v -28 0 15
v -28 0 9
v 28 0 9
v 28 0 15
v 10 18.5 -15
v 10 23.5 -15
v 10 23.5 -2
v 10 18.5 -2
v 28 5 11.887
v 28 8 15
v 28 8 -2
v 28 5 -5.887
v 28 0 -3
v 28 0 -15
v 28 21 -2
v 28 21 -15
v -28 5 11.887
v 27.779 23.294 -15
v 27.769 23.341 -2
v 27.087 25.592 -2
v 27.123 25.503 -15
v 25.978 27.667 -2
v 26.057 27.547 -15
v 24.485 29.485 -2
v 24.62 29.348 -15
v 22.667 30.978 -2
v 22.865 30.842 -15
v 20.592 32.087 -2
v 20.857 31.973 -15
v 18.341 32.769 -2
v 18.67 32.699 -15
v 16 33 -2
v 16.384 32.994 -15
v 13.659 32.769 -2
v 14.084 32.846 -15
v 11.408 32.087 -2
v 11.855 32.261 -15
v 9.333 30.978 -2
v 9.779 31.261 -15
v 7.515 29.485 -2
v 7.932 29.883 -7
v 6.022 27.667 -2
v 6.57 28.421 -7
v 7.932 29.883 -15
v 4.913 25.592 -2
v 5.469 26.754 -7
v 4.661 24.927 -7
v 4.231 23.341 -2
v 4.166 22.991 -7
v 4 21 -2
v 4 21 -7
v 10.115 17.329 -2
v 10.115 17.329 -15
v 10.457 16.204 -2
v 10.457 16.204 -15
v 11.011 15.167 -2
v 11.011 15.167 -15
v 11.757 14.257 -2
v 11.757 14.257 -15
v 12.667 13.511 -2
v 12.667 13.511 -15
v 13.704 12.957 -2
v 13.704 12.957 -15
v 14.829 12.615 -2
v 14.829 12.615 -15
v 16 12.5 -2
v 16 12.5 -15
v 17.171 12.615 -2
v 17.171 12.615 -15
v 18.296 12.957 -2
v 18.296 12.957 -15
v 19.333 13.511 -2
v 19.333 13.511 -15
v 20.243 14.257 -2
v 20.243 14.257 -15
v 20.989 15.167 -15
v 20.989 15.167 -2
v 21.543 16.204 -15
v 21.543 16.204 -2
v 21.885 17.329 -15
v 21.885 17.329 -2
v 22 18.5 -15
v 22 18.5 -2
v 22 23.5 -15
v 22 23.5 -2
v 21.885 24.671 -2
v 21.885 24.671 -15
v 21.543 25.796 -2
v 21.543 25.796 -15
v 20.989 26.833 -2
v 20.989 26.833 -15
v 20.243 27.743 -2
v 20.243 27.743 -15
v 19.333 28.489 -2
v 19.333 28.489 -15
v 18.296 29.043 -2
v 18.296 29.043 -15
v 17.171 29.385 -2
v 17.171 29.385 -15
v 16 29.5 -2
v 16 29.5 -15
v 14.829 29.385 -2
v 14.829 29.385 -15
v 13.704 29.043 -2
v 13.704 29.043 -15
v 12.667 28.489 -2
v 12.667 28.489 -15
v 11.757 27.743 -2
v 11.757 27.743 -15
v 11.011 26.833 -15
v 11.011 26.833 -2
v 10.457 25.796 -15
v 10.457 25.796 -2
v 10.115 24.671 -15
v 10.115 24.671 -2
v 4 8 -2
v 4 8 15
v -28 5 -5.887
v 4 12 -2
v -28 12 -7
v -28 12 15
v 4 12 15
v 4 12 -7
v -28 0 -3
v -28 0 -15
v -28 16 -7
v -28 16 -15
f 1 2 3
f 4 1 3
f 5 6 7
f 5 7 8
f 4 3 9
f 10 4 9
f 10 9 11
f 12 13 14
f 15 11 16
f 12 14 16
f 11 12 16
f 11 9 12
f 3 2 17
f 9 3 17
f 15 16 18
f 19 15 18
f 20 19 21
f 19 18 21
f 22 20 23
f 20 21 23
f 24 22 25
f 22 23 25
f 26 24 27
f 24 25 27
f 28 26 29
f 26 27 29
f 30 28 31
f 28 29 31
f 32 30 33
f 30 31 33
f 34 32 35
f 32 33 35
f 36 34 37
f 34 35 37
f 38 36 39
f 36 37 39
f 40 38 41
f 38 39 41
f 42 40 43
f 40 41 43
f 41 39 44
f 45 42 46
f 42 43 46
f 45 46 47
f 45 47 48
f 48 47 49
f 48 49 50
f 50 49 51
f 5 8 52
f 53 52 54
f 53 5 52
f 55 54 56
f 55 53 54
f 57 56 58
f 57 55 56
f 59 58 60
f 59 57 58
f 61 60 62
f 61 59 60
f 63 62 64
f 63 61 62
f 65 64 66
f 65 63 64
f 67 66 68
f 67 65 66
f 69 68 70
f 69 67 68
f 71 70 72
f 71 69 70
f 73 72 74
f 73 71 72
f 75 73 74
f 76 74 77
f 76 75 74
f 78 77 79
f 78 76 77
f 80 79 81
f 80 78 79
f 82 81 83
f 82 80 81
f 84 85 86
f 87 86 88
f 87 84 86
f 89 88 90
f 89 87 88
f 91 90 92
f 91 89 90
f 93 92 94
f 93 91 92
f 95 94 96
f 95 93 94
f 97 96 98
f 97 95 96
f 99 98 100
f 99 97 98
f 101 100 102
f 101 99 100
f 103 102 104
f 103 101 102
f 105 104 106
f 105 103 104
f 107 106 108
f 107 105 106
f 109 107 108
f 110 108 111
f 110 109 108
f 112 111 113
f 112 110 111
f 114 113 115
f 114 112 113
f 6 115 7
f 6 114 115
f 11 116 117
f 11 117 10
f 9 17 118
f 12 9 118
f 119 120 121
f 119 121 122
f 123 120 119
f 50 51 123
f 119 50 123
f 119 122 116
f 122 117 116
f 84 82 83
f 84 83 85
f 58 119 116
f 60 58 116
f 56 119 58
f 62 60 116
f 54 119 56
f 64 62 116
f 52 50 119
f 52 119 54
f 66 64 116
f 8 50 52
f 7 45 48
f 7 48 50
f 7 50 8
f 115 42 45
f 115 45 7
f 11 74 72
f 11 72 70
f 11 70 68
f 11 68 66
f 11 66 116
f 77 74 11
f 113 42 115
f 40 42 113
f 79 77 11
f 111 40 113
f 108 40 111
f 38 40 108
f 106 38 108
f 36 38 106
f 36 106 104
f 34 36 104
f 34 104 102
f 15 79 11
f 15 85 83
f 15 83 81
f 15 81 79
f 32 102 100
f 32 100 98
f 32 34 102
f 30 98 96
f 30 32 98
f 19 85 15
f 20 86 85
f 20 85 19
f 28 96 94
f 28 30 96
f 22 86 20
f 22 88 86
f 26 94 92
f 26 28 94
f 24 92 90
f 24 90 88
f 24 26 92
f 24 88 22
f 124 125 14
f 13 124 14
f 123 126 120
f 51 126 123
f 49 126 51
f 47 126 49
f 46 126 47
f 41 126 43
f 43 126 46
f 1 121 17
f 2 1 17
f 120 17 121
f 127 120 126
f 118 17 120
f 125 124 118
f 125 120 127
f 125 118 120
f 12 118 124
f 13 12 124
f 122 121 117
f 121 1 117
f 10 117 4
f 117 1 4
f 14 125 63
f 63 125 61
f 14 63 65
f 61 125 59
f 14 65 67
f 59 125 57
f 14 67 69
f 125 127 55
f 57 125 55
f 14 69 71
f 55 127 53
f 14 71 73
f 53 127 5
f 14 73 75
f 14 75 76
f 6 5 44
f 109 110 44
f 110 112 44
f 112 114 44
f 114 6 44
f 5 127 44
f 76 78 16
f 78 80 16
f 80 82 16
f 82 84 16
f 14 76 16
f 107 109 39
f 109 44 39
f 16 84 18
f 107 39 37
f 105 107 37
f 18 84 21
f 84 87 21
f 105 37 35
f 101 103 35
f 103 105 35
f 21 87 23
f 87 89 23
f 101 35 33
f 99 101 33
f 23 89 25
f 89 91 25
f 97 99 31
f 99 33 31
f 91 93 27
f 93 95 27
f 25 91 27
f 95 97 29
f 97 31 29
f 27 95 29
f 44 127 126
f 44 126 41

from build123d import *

# Parameters (mm, degrees)
SKETCH_1_W          = 56
SKETCH_1_H          = 30
EXTRUDE_1_DEPTH     = 8
SKETCH_2_W          = 32
SKETCH_2_H          = 22
EXTRUDE_2_DEPTH     = 4
CUT_EXTRUDE_1_DEPTH = 60.203040462
SKETCH_4_W          = 32
SKETCH_4_H          = 8
EXTRUDE_3_DEPTH     = 8
EXTRUDE_8_DEPTH     = 13
CUT_EXTRUDE_2_DEPTH = 53.659282183
RIB_1_REACH         = 52.488
SKETCH_13_WALL_W    = 150.145150152
SKETCH_13_WALL_H    = 8


with BuildPart() as part:
    # 草图1 → 凸台-拉伸1 (new body)
    with BuildSketch(Plane(origin=(0, 0, 0), x_dir=(1, 0, 0), z_dir=(0, 1, 0))):
        Rectangle(SKETCH_1_W, SKETCH_1_H)
    extrude(amount=EXTRUDE_1_DEPTH)

    # 草图2 → 凸台-拉伸2 (add)
    with BuildSketch(Plane(origin=(0, 8, 0), x_dir=(1, 0, 0), z_dir=(0, 1, 0))):
        with Locations((-12, -4)):
            Rectangle(SKETCH_2_W, SKETCH_2_H)
    extrude(amount=EXTRUDE_2_DEPTH)

    # 草图3 → 切除-拉伸1 (cut, through all)
    with BuildSketch(Plane.ZY.offset(28)):
        Polygon((9, 0), (11.886751346, 5), (-5.886751346, 5), (-3, 0), align=None)
    extrude(amount=-CUT_EXTRUDE_1_DEPTH, mode=Mode.SUBTRACT)

    # 草图4 → 凸台-拉伸3 (add)
    with BuildSketch(Plane(origin=(0, 8, 0), x_dir=(1, 0, 0), z_dir=(0, 1, 0))):
        with Locations((-12, 11)):
            Rectangle(SKETCH_4_W, SKETCH_4_H)
    extrude(amount=EXTRUDE_3_DEPTH)

    # 草图7 → 凸台-拉伸8 (add)
    with BuildSketch(Plane(origin=(0, 0, -15), x_dir=(-1, 0, 0), z_dir=(0, 0, -1))):
        with BuildLine():
            Line((-28, 8), (-28, 21))
            ThreePointArc((-28, 21), (-16, 33), (-4, 21))
            Line((-4, 21), (-4, 8))
            Line((-4, 8), (-28, 8))
        make_face()
    extrude(amount=-EXTRUDE_8_DEPTH)

    # 草图8 → 切除-拉伸2 (cut, through all)
    with BuildSketch(Plane(origin=(0, 0, -15), x_dir=(-1, 0, 0), z_dir=(0, 0, -1))):
        with BuildLine():
            Line((-22, 18.5), (-22, 23.5))
            ThreePointArc((-22, 23.5), (-16, 29.5), (-10, 23.5))
            Line((-10, 23.5), (-10, 18.5))
            ThreePointArc((-10, 18.5), (-16, 12.5), (-22, 18.5))
        make_face()
    extrude(amount=-CUT_EXTRUDE_2_DEPTH, mode=Mode.SUBTRACT)

    # 草图13 wall → 筋1 (add, up to next)
    with BuildSketch(Plane(origin=(-6, 24.5, -11), x_dir=(0.932798134406, 0.360399279202, 0), z_dir=(-0.360399279202, 0.932798134406, 0)), mode=Mode.PRIVATE) as rib_1_sk1:
        Rectangle(SKETCH_13_WALL_W, SKETCH_13_WALL_H)
    rib_1_tool1 = extrude(rib_1_sk1.sketch, amount=-RIB_1_REACH, mode=Mode.PRIVATE) - part.part
    add(rib_1_tool1.solids().sort_by_distance((-6, 24.5, -11))[0])


solid = part.part
